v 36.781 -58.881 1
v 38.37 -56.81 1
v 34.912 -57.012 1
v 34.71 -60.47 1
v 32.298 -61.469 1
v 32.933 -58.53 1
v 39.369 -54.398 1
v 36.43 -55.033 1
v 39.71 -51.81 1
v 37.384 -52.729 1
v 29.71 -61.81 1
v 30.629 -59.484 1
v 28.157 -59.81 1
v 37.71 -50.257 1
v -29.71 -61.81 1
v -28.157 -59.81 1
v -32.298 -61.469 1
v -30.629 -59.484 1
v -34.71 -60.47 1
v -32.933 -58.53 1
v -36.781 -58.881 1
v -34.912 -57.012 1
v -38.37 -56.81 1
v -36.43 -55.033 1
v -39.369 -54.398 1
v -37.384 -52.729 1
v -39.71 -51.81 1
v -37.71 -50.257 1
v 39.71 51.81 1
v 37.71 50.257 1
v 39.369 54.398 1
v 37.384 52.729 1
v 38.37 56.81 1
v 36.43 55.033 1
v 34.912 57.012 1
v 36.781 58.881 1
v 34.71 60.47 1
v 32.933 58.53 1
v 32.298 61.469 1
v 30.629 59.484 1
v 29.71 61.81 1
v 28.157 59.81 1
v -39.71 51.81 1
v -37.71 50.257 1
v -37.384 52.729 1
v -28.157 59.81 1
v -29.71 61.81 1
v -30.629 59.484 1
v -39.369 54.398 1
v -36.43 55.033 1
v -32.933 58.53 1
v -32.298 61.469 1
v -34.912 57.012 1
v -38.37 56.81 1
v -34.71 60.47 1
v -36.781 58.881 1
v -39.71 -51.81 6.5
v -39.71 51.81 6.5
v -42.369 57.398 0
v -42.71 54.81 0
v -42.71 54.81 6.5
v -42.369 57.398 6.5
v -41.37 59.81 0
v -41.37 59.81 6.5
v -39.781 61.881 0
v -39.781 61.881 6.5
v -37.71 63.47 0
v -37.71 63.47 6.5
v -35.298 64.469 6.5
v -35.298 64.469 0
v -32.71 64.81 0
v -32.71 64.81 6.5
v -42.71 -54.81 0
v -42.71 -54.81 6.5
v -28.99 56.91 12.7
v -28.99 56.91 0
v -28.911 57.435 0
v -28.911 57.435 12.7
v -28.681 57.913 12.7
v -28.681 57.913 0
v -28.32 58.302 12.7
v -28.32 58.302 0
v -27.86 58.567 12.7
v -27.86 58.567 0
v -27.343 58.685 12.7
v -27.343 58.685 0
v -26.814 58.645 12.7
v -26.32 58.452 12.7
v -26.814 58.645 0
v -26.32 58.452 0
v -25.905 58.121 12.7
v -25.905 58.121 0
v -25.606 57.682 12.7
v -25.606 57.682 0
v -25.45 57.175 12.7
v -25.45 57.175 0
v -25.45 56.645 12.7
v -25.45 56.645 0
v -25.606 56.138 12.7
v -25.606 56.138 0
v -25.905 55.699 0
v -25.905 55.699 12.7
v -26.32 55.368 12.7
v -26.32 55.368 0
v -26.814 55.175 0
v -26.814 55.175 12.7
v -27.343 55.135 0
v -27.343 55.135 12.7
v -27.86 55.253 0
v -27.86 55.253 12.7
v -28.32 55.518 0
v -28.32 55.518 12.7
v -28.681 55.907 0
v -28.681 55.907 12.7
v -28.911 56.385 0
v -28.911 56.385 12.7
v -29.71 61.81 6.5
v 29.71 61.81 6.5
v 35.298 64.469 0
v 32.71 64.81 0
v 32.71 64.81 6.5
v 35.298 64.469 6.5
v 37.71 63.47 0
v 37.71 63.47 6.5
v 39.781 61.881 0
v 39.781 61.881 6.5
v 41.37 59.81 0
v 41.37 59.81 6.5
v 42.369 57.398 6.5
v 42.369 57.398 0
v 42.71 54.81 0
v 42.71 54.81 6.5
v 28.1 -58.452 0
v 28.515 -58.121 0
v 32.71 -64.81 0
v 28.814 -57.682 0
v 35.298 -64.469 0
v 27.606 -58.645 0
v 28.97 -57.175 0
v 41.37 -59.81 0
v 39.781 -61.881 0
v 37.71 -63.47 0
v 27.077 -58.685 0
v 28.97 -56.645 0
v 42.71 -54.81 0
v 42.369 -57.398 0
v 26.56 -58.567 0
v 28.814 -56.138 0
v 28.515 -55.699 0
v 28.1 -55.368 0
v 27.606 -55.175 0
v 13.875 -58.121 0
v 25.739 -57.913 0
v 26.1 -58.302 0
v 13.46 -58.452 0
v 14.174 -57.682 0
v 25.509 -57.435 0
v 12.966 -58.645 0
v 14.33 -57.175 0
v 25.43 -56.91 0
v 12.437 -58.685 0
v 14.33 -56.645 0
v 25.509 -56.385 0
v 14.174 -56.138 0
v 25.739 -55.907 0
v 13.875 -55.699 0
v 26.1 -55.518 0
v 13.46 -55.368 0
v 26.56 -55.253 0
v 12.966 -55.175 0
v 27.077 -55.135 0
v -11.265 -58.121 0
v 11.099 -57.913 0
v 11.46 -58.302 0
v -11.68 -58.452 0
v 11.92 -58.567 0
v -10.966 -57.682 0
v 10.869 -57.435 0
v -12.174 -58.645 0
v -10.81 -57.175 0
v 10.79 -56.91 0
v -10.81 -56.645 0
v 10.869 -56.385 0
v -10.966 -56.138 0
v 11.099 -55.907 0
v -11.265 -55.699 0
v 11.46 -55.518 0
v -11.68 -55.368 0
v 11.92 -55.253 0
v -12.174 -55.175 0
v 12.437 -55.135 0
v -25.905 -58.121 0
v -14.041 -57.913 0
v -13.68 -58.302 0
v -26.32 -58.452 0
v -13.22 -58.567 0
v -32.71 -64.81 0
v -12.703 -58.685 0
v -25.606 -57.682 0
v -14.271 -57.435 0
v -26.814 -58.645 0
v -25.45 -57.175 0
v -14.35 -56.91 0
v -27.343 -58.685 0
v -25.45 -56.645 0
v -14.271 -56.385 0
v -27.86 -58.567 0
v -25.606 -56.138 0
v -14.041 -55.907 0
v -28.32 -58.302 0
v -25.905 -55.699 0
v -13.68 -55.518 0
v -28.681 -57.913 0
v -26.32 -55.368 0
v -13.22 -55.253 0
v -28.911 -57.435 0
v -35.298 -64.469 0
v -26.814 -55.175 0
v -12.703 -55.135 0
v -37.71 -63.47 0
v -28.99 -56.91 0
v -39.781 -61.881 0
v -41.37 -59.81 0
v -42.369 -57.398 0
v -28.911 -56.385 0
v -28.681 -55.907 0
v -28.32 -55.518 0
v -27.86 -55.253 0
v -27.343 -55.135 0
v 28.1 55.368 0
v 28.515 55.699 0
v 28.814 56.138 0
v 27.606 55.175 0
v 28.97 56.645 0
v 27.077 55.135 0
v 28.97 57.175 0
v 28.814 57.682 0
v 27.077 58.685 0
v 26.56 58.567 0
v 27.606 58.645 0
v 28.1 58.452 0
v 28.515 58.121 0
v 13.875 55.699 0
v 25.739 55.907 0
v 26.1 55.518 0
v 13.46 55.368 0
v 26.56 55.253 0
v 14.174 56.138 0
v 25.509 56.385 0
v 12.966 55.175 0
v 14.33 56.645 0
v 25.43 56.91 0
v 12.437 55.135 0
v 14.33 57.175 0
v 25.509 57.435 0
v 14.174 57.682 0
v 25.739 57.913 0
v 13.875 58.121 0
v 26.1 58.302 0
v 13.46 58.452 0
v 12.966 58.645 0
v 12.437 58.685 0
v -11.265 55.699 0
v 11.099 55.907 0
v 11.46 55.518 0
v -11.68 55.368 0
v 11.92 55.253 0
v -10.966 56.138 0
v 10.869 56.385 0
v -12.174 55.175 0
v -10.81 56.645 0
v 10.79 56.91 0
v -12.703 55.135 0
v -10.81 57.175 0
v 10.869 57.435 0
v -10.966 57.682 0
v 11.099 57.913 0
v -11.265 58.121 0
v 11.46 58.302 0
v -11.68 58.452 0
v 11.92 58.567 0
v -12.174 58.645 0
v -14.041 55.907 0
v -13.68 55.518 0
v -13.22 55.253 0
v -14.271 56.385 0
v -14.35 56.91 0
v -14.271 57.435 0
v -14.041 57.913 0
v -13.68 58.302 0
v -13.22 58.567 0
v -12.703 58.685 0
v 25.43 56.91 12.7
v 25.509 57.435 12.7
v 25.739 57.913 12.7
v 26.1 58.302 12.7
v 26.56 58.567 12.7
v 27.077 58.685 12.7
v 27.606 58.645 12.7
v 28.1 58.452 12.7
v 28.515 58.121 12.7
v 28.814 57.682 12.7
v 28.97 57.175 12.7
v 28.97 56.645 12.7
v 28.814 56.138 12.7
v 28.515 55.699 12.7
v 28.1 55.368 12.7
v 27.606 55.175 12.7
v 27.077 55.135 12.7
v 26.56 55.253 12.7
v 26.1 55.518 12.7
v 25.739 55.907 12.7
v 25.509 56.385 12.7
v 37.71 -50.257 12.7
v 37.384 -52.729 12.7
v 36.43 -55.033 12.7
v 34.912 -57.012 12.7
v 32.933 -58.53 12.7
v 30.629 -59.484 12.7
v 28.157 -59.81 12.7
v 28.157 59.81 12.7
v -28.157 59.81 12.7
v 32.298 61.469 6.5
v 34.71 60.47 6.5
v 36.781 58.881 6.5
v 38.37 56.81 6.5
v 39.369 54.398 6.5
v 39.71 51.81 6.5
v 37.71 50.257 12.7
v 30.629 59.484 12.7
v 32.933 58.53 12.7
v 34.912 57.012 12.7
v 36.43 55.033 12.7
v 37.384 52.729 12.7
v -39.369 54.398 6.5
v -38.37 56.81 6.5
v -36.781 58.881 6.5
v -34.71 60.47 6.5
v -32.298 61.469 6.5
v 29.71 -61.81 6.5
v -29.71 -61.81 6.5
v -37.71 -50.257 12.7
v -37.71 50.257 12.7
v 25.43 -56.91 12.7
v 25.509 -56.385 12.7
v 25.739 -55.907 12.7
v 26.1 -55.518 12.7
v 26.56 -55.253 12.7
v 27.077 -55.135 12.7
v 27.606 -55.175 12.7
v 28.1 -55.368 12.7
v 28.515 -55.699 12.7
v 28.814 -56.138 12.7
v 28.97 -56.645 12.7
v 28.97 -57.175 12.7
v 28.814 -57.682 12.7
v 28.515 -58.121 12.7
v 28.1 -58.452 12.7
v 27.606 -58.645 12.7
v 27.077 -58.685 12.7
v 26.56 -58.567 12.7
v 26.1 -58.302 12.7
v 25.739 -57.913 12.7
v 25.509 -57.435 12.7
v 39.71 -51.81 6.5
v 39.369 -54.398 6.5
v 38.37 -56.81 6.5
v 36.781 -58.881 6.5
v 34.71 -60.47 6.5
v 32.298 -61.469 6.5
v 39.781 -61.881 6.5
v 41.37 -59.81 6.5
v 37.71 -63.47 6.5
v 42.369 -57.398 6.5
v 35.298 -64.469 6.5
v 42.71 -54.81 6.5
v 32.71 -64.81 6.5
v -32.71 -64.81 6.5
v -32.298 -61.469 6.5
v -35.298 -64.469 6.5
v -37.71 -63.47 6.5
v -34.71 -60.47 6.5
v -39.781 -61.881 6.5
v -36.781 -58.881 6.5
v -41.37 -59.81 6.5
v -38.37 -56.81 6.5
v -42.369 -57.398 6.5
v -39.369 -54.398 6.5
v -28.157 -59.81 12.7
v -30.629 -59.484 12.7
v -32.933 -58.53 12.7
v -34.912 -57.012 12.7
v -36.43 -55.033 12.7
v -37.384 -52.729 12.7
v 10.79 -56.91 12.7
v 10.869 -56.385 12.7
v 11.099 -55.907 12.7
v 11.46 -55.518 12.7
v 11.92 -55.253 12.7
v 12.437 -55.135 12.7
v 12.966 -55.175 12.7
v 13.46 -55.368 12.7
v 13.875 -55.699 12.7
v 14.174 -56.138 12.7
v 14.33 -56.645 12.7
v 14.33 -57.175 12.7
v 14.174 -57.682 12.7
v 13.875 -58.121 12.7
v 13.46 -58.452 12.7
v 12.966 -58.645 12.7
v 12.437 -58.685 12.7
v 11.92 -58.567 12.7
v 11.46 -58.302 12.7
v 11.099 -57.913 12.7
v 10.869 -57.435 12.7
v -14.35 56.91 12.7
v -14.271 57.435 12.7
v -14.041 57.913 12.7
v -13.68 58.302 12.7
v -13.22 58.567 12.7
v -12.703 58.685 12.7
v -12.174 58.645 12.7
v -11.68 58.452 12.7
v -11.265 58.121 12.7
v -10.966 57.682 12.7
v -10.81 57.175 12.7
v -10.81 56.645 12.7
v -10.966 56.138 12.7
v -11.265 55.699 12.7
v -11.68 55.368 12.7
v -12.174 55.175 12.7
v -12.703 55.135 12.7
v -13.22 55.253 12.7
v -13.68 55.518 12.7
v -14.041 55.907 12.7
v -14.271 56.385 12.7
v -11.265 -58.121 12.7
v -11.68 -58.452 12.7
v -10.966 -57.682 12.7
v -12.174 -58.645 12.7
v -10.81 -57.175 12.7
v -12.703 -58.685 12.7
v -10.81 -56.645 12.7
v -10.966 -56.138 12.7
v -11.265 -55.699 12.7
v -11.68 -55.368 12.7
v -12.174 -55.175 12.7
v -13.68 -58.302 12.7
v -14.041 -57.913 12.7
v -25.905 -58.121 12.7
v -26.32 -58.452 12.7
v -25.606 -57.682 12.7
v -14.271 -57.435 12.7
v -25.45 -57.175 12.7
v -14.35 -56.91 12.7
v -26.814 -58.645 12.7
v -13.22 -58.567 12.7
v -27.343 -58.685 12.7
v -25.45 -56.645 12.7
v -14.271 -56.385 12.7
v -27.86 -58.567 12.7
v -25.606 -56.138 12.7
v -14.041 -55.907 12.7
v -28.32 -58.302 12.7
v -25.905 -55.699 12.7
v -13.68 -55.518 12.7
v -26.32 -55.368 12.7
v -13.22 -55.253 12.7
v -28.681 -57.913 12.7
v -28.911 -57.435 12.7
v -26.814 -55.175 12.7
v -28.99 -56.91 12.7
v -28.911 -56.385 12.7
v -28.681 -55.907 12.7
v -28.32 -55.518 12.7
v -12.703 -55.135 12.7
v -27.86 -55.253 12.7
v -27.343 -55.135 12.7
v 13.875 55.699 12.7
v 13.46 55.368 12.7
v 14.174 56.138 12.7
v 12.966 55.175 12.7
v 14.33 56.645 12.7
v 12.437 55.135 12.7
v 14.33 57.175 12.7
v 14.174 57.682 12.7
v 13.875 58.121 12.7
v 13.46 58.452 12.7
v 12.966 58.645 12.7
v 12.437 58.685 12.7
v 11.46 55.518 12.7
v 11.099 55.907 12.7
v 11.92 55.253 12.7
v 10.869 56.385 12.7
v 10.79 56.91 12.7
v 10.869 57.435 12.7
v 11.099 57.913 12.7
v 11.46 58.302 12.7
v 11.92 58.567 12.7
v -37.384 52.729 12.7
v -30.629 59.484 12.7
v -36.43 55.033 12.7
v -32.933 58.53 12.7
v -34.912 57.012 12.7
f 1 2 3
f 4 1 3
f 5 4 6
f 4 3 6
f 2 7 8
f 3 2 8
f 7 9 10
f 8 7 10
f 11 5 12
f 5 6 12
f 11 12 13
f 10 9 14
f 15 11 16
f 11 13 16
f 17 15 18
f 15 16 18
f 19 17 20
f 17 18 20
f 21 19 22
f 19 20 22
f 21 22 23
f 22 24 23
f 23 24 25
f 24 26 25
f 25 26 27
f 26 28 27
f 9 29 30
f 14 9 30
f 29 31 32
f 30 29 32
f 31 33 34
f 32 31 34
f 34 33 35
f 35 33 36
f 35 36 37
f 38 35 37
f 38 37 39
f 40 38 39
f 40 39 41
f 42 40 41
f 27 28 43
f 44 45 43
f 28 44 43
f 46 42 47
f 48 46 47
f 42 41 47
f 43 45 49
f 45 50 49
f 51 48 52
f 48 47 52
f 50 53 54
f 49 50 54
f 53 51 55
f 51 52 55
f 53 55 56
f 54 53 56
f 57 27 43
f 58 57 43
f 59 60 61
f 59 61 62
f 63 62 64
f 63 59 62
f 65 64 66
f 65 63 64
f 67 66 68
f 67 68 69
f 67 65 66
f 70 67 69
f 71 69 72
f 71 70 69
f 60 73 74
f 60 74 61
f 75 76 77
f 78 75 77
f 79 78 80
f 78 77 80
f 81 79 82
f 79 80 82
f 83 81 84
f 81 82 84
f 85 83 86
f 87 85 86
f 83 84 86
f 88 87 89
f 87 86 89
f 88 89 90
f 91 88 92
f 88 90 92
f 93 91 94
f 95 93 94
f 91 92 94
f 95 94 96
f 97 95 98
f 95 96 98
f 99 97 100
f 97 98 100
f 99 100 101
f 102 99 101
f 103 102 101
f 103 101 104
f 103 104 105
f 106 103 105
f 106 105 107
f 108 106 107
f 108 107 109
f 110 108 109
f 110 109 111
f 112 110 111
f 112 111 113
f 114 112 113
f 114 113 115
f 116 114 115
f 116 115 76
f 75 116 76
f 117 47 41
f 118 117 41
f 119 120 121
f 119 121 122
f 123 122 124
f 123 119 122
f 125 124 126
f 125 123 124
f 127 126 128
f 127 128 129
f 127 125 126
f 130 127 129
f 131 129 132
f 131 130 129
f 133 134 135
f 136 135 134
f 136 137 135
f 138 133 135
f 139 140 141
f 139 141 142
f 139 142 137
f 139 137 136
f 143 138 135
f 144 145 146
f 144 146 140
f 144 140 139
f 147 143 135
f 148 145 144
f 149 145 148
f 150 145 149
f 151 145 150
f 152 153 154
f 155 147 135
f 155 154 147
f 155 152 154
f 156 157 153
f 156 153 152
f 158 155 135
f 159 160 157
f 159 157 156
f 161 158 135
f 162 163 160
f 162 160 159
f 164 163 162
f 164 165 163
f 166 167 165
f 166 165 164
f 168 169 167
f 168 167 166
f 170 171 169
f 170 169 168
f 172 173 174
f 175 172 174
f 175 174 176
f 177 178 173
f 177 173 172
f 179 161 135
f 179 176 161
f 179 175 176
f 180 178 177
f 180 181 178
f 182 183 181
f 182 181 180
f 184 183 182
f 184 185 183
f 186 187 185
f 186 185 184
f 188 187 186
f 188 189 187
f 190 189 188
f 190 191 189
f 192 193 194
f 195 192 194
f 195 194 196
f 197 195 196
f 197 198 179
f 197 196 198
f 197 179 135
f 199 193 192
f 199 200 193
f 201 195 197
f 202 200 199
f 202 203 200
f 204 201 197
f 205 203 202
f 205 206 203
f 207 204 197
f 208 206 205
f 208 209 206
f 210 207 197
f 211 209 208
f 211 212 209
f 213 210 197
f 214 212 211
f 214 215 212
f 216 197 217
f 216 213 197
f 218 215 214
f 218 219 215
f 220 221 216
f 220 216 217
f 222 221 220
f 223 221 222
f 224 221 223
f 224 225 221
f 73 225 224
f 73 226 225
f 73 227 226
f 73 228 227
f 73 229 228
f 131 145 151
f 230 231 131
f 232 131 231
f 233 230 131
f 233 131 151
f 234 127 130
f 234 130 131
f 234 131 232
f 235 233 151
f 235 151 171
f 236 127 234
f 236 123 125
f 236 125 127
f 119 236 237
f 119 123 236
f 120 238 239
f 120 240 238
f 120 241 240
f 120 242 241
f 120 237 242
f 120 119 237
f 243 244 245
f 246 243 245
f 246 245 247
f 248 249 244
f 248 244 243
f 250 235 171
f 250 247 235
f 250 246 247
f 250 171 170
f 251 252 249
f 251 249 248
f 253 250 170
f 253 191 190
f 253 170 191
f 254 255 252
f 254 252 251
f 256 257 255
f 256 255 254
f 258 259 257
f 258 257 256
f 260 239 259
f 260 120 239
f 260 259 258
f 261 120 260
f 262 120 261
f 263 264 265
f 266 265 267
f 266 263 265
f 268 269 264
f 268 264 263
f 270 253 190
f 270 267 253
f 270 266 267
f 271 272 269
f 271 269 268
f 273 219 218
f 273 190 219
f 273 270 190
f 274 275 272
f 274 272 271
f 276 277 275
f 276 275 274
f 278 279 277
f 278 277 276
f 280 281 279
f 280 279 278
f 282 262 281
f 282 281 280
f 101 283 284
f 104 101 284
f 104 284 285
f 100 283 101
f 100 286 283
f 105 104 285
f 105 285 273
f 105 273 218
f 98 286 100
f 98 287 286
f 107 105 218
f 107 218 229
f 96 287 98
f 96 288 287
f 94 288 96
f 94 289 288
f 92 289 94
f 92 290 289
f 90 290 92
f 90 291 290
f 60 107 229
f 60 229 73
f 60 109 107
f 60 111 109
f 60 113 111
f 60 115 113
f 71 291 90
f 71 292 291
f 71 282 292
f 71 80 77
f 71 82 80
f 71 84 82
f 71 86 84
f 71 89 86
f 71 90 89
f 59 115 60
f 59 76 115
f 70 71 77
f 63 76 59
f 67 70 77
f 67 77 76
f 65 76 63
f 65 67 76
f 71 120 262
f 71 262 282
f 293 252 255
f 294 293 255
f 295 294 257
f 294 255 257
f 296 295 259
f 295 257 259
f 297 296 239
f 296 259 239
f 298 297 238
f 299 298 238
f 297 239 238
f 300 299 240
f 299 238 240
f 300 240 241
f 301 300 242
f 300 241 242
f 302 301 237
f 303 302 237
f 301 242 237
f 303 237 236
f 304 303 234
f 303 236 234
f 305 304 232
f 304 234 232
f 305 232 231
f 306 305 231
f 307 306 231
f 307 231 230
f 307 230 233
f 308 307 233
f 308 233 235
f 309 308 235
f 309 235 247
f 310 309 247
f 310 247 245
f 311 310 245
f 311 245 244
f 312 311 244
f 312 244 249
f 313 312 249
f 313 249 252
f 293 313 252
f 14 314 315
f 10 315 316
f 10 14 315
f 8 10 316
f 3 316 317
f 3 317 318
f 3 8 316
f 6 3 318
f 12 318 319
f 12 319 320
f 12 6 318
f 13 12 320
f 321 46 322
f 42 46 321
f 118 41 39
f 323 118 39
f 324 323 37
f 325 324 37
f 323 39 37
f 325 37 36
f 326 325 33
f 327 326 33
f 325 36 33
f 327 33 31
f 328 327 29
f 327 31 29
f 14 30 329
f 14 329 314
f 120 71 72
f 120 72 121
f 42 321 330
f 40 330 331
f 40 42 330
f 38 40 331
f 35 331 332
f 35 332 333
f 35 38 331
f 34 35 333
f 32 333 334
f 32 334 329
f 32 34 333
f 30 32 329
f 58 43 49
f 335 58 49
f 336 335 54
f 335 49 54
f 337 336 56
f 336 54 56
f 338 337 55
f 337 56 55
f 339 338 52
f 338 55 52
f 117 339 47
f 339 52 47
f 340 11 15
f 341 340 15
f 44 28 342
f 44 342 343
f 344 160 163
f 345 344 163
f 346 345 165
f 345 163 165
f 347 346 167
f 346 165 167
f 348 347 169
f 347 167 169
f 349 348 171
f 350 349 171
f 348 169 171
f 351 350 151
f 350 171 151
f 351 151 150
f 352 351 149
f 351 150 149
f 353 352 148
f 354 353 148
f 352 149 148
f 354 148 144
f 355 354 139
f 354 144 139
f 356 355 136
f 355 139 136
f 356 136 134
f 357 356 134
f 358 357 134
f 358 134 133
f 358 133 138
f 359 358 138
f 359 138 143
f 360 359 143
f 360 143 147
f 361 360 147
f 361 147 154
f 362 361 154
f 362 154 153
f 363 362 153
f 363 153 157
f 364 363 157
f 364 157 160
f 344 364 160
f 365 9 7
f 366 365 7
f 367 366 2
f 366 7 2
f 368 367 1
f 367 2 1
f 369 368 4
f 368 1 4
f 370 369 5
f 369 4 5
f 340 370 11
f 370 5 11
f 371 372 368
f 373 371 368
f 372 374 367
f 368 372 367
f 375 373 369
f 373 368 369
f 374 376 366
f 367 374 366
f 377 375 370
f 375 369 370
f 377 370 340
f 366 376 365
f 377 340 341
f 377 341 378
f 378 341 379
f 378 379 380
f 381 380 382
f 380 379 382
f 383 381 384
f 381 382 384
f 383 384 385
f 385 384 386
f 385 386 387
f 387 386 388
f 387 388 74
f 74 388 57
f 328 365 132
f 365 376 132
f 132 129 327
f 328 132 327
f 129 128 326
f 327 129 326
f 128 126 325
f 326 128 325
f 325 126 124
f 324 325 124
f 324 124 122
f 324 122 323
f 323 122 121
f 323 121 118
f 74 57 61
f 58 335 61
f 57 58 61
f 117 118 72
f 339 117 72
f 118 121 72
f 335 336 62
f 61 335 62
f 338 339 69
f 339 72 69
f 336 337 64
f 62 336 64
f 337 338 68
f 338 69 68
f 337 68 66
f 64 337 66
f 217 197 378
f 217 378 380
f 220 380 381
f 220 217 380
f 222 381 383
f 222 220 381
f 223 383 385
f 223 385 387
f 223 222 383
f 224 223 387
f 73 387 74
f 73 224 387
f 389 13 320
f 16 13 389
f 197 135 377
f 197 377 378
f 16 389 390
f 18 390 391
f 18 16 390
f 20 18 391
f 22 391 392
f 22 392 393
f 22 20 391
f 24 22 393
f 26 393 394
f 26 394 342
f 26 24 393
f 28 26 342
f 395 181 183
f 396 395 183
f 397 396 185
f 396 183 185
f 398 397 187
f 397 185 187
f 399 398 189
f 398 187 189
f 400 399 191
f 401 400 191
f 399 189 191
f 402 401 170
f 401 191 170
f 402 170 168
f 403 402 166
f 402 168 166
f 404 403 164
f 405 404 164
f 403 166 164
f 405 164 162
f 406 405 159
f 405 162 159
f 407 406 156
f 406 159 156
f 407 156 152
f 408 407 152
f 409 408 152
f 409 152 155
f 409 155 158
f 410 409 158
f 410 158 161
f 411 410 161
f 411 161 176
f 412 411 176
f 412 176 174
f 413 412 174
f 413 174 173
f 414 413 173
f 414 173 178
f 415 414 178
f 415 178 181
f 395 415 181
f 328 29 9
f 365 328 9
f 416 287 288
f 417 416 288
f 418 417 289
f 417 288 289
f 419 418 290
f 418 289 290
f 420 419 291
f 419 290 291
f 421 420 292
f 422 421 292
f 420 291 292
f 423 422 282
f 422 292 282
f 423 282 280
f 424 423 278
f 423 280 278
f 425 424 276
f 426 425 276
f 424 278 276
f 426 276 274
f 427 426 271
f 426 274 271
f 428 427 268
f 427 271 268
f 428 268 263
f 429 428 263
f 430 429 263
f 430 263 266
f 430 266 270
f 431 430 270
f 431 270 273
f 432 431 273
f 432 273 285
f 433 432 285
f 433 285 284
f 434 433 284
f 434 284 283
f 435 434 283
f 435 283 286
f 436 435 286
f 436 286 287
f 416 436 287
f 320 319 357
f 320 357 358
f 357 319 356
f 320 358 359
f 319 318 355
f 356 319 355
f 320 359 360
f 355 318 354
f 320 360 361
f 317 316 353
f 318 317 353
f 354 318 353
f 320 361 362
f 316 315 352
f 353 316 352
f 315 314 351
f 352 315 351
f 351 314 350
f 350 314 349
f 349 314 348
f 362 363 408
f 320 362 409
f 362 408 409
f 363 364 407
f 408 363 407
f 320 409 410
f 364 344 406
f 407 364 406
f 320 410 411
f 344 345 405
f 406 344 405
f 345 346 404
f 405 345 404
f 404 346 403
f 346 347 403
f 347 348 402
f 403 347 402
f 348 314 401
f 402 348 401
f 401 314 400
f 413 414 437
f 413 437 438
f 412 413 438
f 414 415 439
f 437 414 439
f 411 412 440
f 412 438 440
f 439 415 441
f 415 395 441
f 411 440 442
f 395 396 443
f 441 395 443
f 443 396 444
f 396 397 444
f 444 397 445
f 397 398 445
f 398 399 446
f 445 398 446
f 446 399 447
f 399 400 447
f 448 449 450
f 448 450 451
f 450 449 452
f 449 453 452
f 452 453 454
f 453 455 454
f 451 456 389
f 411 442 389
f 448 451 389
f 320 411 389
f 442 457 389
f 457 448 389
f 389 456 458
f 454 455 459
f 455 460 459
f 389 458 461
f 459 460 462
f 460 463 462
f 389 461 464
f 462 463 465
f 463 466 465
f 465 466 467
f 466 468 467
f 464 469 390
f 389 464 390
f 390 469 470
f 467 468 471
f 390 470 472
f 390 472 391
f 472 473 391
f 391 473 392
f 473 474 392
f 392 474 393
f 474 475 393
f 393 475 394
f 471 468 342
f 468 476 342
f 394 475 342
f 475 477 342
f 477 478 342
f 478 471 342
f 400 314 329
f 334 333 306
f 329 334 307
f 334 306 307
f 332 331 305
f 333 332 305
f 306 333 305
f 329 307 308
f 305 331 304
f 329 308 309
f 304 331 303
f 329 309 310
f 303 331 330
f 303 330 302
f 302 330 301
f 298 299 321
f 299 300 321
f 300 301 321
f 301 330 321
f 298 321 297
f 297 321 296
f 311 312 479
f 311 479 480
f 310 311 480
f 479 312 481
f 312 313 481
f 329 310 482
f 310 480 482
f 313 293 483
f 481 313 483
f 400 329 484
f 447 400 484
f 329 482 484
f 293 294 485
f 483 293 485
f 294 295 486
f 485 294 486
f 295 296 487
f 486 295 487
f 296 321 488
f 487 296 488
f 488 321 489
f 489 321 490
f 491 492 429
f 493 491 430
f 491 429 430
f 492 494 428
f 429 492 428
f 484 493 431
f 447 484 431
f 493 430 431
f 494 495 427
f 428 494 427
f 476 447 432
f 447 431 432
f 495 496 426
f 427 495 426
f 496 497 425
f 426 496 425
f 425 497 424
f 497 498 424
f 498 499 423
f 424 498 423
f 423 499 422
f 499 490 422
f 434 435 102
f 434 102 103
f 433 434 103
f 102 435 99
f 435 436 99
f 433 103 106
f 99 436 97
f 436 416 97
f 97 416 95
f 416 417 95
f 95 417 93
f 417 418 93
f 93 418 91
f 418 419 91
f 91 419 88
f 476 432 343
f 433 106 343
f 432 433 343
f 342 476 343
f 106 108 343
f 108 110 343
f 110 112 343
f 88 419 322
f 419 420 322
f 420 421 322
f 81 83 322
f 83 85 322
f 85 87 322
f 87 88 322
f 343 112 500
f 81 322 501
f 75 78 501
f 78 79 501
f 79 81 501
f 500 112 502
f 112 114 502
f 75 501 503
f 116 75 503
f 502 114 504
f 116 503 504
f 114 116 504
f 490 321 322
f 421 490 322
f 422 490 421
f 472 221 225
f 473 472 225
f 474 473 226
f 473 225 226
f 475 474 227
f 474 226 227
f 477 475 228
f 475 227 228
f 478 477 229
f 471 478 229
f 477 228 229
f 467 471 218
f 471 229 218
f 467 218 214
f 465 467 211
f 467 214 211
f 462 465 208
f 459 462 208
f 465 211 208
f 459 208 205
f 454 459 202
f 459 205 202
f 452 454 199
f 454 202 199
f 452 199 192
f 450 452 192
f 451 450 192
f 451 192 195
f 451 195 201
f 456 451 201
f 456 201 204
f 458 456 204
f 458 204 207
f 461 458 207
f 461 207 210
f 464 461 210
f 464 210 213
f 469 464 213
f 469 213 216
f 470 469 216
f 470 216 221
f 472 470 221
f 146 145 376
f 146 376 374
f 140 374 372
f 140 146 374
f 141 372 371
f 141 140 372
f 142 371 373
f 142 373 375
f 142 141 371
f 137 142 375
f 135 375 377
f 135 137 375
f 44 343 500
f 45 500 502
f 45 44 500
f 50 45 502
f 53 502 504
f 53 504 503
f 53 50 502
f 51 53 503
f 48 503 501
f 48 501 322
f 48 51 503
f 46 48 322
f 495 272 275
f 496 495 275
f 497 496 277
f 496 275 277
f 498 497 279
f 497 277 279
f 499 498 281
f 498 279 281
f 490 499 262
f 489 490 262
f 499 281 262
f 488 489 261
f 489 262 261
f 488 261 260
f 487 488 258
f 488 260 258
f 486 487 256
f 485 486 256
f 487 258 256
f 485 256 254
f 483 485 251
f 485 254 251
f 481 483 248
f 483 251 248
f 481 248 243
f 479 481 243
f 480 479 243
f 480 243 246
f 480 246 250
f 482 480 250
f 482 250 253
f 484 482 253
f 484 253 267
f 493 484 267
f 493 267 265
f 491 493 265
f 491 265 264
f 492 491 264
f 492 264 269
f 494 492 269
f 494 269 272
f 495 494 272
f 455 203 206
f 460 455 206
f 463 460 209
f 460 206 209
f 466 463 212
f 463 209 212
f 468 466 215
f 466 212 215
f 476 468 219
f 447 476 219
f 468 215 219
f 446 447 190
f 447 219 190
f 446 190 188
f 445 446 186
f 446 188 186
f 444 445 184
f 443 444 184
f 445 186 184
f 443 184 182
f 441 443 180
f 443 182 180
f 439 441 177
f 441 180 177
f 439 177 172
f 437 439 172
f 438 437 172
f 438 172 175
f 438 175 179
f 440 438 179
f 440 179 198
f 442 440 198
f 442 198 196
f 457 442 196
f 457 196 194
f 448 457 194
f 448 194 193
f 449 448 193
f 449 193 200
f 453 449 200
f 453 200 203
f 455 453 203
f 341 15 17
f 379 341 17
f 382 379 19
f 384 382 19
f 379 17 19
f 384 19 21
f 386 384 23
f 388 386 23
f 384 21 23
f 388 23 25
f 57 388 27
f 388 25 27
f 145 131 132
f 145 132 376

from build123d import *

# Parameters (mm, degrees)
EXTRUDE_2_DEPTH     = 6.5
EXTRUDE_3_DEPTH     = 12.7
EXTRUDE_4_DEPTH     = 1
SKETCH_5_R          = 1.78
CUT_EXTRUDE_1_DEPTH = 79.649667514


with BuildPart() as part:
    # basis → 凸台-拉伸2 (new body)
    with BuildSketch(Plane.XY):
        with BuildLine():
            Line((32.71, 64.81), (-32.71, 64.81))
            ThreePointArc((-32.71, 64.81), (-39.781067812, 61.881067812), (-42.71, 54.81))
            Line((-42.71, 54.81), (-42.71, -54.81))
            ThreePointArc((-42.71, -54.81), (-39.781067812, -61.881067812), (-32.71, -64.81))
            Line((-32.71, -64.81), (32.71, -64.81))
            ThreePointArc((32.71, -64.81), (39.781067812, -61.881067812), (42.71, -54.81))
            Line((42.71, -54.81), (42.71, 54.81))
            ThreePointArc((42.71, 54.81), (39.781067812, 61.881067812), (32.71, 64.81))
        make_face()
        with BuildLine():
            ThreePointArc((-39.71, 51.81), (-36.781067812, 58.881067812), (-29.71, 61.81))
            Line((-29.71, 61.81), (29.71, 61.81))
            ThreePointArc((29.71, 61.81), (36.781067812, 58.881067812), (39.71, 51.81))
            Line((39.71, 51.81), (39.71, -51.81))
            ThreePointArc((39.71, -51.81), (36.781067812, -58.881067812), (29.71, -61.81))
            Line((29.71, -61.81), (-29.71, -61.81))
            ThreePointArc((-29.71, -61.81), (-36.781067812, -58.881067812), (-39.71, -51.81))
            Line((-39.71, -51.81), (-39.71, 51.81))
        make_face(mode=Mode.SUBTRACT)
    extrude(amount=EXTRUDE_2_DEPTH)



with BuildPart() as body_2:
    # basis<4> → 凸台-拉伸3 (new body)
    with BuildSketch(Plane.XY):
        with BuildLine():
            Line((28.1566, 59.81), (-28.1566, 59.81))
            ThreePointArc((-28.1566, 59.81), (-34.911873923, 57.011873923), (-37.71, 50.2566))
            Line((-37.71, 50.2566), (-37.71, -50.2566))
            ThreePointArc((-37.71, -50.2566), (-34.911873923, -57.011873923), (-28.1566, -59.81))
            Line((-28.1566, -59.81), (28.1566, -59.81))
            ThreePointArc((28.1566, -59.81), (34.911873923, -57.011873923), (37.71, -50.2566))
            Line((37.71, -50.2566), (37.71, 50.2566))
            ThreePointArc((37.71, 50.2566), (34.911873923, 57.011873923), (28.1566, 59.81))
        make_face()
    extrude(amount=EXTRUDE_3_DEPTH)


with BuildPart() as part_1:
    add(part.part)

    add(body_2.part)  # 凸台-拉伸4 merges body 2
    # basis<5> → 凸台-拉伸4 (add)
    with BuildSketch(Plane.XY):
        with BuildLine():
            Line((29.71, 61.81), (-29.71, 61.81))
            ThreePointArc((-29.71, 61.81), (-36.781067812, 58.881067812), (-39.71, 51.81))
            Line((-39.71, 51.81), (-39.71, -51.81))
            ThreePointArc((-39.71, -51.81), (-36.781067812, -58.881067812), (-29.71, -61.81))
            Line((-29.71, -61.81), (29.71, -61.81))
            ThreePointArc((29.71, -61.81), (36.781067812, -58.881067812), (39.71, -51.81))
            Line((39.71, -51.81), (39.71, 51.81))
            ThreePointArc((39.71, 51.81), (36.781067812, 58.881067812), (29.71, 61.81))
        make_face()
        with BuildLine():
            ThreePointArc((-37.71, 50.2566), (-34.911873923, 57.011873923), (-28.1566, 59.81))
            Line((-28.1566, 59.81), (28.1566, 59.81))
            ThreePointArc((28.1566, 59.81), (34.911873923, 57.011873923), (37.71, 50.2566))
            Line((37.71, 50.2566), (37.71, -50.2566))
            ThreePointArc((37.71, -50.2566), (34.911873923, -57.011873923), (28.1566, -59.81))
            Line((28.1566, -59.81), (-28.1566, -59.81))
            ThreePointArc((-28.1566, -59.81), (-34.911873923, -57.011873923), (-37.71, -50.2566))
            Line((-37.71, -50.2566), (-37.71, 50.2566))
        make_face(mode=Mode.SUBTRACT)
    extrude(amount=EXTRUDE_4_DEPTH)

    # 草图5 → 切除-拉伸1 (cut, through all)
    with BuildSketch(Plane(origin=(0, 0, 0), x_dir=(-1, 0, 0), z_dir=(0, 0, -1))):
        with Locations((27.21, 56.91)):
            Circle(SKETCH_5_R)
        with Locations((12.57, 56.91)):
            Circle(SKETCH_5_R)
        with Locations((-12.57, 56.91)):
            Circle(SKETCH_5_R)
        with Locations((-27.21, 56.91)):
            Circle(SKETCH_5_R)
        with Locations((27.21, -56.91)):
            Circle(SKETCH_5_R)
        with Locations((12.57, -56.91)):
            Circle(SKETCH_5_R)
        with Locations((-12.57, -56.91)):
            Circle(SKETCH_5_R)
        with Locations((-27.21, -56.91)):
            Circle(SKETCH_5_R)
    extrude(amount=-CUT_EXTRUDE_1_DEPTH, mode=Mode.SUBTRACT)


solid = part_1.part
